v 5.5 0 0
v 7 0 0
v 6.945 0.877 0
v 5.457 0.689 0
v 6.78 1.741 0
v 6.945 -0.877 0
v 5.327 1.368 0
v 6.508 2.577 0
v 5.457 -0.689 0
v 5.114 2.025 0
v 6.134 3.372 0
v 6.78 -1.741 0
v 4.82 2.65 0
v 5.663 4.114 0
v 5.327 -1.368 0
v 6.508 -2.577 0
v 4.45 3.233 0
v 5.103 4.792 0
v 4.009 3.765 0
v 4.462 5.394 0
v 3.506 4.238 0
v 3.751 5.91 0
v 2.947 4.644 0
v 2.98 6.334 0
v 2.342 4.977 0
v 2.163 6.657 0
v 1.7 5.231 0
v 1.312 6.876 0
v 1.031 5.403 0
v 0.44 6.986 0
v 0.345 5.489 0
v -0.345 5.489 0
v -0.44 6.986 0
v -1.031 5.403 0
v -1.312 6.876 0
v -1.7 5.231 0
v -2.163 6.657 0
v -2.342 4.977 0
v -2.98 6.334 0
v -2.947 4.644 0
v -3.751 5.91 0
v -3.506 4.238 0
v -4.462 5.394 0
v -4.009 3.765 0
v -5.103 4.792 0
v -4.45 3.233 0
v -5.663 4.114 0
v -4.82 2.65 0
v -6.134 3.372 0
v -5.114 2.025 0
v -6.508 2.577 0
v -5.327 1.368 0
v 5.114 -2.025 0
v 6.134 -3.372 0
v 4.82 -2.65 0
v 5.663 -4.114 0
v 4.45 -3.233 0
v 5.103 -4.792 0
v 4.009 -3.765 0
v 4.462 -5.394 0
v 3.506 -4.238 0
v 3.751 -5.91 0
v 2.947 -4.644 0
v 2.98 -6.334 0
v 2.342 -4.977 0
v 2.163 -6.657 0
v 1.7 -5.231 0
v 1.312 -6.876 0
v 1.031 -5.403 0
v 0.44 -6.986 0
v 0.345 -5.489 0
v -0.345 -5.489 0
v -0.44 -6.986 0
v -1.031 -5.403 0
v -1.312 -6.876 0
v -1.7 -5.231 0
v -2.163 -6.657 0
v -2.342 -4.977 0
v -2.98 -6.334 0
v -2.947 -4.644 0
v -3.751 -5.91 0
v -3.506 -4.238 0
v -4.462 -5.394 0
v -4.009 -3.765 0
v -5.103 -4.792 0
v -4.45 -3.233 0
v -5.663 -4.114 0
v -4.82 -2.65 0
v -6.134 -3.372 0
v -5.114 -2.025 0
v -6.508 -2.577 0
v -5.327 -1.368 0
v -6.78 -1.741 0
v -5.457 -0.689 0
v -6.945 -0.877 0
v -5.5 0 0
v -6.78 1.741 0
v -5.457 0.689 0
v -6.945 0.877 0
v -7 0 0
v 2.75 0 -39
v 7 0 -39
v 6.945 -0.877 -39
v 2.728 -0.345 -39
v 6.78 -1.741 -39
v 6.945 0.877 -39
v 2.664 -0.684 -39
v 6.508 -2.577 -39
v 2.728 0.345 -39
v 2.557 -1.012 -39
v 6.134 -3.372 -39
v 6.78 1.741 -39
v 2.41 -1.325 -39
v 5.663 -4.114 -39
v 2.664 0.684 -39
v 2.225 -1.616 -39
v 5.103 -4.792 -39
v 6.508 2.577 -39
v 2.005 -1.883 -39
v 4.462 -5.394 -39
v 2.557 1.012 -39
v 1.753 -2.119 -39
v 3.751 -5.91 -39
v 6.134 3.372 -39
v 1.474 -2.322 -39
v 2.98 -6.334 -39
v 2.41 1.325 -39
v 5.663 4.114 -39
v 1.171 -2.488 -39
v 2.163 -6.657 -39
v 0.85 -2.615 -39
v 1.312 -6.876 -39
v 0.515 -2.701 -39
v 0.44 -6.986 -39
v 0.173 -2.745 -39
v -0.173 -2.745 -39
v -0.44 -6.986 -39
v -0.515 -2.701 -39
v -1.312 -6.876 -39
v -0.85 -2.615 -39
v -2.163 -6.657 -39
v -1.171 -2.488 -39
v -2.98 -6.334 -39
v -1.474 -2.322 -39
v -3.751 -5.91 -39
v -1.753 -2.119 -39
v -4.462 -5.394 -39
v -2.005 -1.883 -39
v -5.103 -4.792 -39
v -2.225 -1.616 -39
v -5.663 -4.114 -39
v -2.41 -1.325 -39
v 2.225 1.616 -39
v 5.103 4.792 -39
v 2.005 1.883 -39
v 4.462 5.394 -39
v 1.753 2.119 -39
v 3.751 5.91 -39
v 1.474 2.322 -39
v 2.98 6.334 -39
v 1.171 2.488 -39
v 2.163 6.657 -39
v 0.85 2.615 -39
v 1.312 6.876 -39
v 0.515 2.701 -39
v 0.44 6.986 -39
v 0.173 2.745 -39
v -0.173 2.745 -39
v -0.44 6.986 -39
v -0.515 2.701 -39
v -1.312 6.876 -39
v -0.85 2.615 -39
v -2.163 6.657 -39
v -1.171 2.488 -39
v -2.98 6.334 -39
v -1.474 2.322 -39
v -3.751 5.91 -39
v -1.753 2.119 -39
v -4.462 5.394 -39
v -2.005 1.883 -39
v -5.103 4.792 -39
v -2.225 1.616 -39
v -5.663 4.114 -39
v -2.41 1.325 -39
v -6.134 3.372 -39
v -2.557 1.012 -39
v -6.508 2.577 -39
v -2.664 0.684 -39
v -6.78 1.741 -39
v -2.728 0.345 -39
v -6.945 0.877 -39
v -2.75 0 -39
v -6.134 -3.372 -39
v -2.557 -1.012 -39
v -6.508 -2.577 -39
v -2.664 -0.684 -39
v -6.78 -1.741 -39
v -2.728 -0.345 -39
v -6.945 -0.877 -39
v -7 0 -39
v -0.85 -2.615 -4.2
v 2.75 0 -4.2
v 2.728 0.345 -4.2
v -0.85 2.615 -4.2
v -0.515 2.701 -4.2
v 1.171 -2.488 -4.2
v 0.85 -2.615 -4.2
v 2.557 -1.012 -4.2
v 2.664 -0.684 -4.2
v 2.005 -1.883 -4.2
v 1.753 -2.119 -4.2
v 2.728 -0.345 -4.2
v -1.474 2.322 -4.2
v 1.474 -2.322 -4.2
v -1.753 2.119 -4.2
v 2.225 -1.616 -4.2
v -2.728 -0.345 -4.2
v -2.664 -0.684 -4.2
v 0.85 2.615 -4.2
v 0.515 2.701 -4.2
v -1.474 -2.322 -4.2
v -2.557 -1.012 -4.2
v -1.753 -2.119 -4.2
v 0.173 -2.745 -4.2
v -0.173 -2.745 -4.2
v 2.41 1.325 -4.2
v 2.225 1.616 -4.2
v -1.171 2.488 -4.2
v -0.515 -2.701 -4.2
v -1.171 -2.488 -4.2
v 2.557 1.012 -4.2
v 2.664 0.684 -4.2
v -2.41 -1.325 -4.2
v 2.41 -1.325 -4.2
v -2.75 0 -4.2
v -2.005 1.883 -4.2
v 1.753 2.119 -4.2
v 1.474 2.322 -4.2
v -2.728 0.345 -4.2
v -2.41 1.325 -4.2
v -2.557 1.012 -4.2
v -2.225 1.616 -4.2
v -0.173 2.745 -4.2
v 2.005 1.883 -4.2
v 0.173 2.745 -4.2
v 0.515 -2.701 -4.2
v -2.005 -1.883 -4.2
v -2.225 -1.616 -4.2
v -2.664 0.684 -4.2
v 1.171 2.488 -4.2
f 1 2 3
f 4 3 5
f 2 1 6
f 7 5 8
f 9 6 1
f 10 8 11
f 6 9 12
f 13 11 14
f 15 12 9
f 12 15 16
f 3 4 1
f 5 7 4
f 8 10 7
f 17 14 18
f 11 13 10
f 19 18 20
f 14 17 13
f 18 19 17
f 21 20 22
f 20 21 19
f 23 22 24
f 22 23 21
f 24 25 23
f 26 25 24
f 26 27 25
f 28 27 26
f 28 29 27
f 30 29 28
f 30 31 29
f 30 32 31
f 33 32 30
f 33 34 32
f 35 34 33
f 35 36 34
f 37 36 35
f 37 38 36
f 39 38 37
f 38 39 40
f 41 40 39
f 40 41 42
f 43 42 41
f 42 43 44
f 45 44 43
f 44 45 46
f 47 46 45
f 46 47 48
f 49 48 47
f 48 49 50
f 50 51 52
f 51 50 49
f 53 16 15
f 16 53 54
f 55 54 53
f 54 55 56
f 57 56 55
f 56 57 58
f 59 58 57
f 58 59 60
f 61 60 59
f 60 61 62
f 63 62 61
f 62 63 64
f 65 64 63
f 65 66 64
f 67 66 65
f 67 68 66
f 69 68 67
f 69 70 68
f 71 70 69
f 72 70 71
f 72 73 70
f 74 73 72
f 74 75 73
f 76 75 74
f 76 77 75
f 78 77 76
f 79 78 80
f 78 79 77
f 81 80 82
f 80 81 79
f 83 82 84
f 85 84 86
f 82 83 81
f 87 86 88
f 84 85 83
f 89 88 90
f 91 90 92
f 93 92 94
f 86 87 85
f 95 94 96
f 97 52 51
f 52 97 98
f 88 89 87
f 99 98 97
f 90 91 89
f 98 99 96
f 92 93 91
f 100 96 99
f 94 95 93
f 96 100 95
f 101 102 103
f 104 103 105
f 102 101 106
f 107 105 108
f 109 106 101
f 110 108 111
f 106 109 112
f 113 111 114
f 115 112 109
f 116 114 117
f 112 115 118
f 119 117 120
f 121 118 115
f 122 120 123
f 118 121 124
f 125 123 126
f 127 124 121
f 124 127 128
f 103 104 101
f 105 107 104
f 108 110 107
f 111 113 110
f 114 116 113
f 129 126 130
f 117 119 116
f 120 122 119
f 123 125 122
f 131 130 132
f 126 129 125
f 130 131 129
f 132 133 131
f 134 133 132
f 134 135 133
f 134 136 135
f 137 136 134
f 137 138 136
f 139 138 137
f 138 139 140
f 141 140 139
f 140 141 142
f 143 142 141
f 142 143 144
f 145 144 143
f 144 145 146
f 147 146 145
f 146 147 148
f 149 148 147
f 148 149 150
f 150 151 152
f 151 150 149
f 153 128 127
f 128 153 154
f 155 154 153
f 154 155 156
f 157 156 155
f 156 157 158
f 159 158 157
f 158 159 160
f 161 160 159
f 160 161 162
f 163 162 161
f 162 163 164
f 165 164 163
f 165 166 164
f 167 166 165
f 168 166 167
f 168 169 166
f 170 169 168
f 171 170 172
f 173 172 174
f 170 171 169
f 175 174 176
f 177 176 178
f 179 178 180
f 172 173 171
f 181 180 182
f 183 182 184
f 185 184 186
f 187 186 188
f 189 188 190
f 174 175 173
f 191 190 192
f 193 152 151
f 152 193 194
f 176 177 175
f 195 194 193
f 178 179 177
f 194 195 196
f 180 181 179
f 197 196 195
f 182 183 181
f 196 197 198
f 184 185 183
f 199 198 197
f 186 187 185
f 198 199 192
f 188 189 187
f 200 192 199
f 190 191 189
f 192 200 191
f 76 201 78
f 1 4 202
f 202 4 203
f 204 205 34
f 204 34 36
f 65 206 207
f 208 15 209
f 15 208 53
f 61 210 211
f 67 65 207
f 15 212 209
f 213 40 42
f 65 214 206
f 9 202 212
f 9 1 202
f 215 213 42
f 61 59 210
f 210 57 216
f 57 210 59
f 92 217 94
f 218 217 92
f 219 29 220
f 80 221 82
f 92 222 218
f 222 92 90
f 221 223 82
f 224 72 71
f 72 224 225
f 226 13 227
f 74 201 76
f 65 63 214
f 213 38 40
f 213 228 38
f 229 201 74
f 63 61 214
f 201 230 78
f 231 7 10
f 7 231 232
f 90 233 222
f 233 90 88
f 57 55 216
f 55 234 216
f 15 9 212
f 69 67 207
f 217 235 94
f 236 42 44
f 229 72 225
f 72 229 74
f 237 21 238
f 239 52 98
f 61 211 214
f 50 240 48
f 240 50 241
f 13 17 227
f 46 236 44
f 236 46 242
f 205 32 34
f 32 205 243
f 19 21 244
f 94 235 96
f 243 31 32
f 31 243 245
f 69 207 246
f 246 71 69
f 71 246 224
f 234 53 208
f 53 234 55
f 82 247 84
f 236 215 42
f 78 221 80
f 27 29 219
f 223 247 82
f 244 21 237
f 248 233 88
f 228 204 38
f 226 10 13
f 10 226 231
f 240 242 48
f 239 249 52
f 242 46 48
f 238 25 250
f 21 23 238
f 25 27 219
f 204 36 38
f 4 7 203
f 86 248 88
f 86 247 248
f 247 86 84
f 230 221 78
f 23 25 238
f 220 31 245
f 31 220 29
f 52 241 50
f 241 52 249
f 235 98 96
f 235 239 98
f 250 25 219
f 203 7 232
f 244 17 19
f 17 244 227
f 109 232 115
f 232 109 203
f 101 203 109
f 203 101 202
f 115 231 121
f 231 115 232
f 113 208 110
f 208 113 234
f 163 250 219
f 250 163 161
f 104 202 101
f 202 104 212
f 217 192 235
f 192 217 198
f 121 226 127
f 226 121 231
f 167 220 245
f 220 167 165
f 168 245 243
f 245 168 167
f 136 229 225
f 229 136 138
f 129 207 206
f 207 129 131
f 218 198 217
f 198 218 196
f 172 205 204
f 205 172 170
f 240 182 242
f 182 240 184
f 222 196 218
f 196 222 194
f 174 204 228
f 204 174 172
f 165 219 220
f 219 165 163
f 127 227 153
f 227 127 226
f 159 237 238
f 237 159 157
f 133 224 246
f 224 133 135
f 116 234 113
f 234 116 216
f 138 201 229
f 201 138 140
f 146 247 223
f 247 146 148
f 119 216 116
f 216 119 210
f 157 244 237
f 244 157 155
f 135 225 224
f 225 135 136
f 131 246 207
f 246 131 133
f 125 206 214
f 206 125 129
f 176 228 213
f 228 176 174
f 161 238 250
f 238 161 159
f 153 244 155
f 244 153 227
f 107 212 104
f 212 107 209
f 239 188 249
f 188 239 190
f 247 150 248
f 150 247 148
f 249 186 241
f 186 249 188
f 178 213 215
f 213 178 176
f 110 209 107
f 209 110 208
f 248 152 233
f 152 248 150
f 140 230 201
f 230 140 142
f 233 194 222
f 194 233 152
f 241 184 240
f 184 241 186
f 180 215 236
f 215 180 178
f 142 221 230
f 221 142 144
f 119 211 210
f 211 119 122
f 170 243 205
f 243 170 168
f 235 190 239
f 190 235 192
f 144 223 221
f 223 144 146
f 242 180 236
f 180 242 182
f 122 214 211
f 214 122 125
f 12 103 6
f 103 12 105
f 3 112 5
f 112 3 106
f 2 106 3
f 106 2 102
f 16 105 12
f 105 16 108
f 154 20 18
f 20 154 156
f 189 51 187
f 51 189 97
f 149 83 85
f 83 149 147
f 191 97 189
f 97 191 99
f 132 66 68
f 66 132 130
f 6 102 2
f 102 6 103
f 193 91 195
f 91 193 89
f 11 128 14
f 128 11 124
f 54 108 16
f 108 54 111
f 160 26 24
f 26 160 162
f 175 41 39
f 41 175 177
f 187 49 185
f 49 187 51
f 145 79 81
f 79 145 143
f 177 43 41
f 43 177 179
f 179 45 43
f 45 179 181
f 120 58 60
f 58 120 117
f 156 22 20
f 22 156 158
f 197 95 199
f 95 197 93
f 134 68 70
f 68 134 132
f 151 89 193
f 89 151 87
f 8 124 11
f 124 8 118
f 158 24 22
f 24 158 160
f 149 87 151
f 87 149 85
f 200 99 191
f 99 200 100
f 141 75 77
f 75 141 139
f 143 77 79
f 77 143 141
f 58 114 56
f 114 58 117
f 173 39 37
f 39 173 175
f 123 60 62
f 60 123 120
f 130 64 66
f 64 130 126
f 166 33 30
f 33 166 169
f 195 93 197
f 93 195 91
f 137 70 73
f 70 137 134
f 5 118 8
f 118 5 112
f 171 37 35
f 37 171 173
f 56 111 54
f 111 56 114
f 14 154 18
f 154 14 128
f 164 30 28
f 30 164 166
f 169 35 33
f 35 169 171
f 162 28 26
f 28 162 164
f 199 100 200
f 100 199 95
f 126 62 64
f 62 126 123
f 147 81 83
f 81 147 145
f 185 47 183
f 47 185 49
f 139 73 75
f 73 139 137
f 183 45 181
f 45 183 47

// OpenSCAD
$fn = 50;


difference() {
	union() {
		translate(v = [0, 0, -39.0000000000]) {
			cylinder(h = 39, r = 7.0000000000);
		}
		cylinder(h = 0, r = 17.0000000000);
	}
	union() {
		translate(v = [0, 0, 0]) {
			rotate(a = [0, 0, 0]) {
				difference() {
					union() {
						#translate(v = [0, 0, -39.0000000000]) {
							cylinder(h = 39, r = 2.2500000000);
						}
						#translate(v = [0, 0, -4.2000000000]) {
							cylinder(h = 4.2000000000, r = 7.0000000000, r1 = 2.7500000000, r2 = 5.5000000000);
						}
						#translate(v = [0, 0, -39.0000000000]) {
							cylinder(h = 39, r = 2.7500000000);
						}
						#translate(v = [0, 0, -39.0000000000]) {
							cylinder(h = 39, r = 2.2500000000);
						}
					}
					union();
				}
			}
		}
	}
}
